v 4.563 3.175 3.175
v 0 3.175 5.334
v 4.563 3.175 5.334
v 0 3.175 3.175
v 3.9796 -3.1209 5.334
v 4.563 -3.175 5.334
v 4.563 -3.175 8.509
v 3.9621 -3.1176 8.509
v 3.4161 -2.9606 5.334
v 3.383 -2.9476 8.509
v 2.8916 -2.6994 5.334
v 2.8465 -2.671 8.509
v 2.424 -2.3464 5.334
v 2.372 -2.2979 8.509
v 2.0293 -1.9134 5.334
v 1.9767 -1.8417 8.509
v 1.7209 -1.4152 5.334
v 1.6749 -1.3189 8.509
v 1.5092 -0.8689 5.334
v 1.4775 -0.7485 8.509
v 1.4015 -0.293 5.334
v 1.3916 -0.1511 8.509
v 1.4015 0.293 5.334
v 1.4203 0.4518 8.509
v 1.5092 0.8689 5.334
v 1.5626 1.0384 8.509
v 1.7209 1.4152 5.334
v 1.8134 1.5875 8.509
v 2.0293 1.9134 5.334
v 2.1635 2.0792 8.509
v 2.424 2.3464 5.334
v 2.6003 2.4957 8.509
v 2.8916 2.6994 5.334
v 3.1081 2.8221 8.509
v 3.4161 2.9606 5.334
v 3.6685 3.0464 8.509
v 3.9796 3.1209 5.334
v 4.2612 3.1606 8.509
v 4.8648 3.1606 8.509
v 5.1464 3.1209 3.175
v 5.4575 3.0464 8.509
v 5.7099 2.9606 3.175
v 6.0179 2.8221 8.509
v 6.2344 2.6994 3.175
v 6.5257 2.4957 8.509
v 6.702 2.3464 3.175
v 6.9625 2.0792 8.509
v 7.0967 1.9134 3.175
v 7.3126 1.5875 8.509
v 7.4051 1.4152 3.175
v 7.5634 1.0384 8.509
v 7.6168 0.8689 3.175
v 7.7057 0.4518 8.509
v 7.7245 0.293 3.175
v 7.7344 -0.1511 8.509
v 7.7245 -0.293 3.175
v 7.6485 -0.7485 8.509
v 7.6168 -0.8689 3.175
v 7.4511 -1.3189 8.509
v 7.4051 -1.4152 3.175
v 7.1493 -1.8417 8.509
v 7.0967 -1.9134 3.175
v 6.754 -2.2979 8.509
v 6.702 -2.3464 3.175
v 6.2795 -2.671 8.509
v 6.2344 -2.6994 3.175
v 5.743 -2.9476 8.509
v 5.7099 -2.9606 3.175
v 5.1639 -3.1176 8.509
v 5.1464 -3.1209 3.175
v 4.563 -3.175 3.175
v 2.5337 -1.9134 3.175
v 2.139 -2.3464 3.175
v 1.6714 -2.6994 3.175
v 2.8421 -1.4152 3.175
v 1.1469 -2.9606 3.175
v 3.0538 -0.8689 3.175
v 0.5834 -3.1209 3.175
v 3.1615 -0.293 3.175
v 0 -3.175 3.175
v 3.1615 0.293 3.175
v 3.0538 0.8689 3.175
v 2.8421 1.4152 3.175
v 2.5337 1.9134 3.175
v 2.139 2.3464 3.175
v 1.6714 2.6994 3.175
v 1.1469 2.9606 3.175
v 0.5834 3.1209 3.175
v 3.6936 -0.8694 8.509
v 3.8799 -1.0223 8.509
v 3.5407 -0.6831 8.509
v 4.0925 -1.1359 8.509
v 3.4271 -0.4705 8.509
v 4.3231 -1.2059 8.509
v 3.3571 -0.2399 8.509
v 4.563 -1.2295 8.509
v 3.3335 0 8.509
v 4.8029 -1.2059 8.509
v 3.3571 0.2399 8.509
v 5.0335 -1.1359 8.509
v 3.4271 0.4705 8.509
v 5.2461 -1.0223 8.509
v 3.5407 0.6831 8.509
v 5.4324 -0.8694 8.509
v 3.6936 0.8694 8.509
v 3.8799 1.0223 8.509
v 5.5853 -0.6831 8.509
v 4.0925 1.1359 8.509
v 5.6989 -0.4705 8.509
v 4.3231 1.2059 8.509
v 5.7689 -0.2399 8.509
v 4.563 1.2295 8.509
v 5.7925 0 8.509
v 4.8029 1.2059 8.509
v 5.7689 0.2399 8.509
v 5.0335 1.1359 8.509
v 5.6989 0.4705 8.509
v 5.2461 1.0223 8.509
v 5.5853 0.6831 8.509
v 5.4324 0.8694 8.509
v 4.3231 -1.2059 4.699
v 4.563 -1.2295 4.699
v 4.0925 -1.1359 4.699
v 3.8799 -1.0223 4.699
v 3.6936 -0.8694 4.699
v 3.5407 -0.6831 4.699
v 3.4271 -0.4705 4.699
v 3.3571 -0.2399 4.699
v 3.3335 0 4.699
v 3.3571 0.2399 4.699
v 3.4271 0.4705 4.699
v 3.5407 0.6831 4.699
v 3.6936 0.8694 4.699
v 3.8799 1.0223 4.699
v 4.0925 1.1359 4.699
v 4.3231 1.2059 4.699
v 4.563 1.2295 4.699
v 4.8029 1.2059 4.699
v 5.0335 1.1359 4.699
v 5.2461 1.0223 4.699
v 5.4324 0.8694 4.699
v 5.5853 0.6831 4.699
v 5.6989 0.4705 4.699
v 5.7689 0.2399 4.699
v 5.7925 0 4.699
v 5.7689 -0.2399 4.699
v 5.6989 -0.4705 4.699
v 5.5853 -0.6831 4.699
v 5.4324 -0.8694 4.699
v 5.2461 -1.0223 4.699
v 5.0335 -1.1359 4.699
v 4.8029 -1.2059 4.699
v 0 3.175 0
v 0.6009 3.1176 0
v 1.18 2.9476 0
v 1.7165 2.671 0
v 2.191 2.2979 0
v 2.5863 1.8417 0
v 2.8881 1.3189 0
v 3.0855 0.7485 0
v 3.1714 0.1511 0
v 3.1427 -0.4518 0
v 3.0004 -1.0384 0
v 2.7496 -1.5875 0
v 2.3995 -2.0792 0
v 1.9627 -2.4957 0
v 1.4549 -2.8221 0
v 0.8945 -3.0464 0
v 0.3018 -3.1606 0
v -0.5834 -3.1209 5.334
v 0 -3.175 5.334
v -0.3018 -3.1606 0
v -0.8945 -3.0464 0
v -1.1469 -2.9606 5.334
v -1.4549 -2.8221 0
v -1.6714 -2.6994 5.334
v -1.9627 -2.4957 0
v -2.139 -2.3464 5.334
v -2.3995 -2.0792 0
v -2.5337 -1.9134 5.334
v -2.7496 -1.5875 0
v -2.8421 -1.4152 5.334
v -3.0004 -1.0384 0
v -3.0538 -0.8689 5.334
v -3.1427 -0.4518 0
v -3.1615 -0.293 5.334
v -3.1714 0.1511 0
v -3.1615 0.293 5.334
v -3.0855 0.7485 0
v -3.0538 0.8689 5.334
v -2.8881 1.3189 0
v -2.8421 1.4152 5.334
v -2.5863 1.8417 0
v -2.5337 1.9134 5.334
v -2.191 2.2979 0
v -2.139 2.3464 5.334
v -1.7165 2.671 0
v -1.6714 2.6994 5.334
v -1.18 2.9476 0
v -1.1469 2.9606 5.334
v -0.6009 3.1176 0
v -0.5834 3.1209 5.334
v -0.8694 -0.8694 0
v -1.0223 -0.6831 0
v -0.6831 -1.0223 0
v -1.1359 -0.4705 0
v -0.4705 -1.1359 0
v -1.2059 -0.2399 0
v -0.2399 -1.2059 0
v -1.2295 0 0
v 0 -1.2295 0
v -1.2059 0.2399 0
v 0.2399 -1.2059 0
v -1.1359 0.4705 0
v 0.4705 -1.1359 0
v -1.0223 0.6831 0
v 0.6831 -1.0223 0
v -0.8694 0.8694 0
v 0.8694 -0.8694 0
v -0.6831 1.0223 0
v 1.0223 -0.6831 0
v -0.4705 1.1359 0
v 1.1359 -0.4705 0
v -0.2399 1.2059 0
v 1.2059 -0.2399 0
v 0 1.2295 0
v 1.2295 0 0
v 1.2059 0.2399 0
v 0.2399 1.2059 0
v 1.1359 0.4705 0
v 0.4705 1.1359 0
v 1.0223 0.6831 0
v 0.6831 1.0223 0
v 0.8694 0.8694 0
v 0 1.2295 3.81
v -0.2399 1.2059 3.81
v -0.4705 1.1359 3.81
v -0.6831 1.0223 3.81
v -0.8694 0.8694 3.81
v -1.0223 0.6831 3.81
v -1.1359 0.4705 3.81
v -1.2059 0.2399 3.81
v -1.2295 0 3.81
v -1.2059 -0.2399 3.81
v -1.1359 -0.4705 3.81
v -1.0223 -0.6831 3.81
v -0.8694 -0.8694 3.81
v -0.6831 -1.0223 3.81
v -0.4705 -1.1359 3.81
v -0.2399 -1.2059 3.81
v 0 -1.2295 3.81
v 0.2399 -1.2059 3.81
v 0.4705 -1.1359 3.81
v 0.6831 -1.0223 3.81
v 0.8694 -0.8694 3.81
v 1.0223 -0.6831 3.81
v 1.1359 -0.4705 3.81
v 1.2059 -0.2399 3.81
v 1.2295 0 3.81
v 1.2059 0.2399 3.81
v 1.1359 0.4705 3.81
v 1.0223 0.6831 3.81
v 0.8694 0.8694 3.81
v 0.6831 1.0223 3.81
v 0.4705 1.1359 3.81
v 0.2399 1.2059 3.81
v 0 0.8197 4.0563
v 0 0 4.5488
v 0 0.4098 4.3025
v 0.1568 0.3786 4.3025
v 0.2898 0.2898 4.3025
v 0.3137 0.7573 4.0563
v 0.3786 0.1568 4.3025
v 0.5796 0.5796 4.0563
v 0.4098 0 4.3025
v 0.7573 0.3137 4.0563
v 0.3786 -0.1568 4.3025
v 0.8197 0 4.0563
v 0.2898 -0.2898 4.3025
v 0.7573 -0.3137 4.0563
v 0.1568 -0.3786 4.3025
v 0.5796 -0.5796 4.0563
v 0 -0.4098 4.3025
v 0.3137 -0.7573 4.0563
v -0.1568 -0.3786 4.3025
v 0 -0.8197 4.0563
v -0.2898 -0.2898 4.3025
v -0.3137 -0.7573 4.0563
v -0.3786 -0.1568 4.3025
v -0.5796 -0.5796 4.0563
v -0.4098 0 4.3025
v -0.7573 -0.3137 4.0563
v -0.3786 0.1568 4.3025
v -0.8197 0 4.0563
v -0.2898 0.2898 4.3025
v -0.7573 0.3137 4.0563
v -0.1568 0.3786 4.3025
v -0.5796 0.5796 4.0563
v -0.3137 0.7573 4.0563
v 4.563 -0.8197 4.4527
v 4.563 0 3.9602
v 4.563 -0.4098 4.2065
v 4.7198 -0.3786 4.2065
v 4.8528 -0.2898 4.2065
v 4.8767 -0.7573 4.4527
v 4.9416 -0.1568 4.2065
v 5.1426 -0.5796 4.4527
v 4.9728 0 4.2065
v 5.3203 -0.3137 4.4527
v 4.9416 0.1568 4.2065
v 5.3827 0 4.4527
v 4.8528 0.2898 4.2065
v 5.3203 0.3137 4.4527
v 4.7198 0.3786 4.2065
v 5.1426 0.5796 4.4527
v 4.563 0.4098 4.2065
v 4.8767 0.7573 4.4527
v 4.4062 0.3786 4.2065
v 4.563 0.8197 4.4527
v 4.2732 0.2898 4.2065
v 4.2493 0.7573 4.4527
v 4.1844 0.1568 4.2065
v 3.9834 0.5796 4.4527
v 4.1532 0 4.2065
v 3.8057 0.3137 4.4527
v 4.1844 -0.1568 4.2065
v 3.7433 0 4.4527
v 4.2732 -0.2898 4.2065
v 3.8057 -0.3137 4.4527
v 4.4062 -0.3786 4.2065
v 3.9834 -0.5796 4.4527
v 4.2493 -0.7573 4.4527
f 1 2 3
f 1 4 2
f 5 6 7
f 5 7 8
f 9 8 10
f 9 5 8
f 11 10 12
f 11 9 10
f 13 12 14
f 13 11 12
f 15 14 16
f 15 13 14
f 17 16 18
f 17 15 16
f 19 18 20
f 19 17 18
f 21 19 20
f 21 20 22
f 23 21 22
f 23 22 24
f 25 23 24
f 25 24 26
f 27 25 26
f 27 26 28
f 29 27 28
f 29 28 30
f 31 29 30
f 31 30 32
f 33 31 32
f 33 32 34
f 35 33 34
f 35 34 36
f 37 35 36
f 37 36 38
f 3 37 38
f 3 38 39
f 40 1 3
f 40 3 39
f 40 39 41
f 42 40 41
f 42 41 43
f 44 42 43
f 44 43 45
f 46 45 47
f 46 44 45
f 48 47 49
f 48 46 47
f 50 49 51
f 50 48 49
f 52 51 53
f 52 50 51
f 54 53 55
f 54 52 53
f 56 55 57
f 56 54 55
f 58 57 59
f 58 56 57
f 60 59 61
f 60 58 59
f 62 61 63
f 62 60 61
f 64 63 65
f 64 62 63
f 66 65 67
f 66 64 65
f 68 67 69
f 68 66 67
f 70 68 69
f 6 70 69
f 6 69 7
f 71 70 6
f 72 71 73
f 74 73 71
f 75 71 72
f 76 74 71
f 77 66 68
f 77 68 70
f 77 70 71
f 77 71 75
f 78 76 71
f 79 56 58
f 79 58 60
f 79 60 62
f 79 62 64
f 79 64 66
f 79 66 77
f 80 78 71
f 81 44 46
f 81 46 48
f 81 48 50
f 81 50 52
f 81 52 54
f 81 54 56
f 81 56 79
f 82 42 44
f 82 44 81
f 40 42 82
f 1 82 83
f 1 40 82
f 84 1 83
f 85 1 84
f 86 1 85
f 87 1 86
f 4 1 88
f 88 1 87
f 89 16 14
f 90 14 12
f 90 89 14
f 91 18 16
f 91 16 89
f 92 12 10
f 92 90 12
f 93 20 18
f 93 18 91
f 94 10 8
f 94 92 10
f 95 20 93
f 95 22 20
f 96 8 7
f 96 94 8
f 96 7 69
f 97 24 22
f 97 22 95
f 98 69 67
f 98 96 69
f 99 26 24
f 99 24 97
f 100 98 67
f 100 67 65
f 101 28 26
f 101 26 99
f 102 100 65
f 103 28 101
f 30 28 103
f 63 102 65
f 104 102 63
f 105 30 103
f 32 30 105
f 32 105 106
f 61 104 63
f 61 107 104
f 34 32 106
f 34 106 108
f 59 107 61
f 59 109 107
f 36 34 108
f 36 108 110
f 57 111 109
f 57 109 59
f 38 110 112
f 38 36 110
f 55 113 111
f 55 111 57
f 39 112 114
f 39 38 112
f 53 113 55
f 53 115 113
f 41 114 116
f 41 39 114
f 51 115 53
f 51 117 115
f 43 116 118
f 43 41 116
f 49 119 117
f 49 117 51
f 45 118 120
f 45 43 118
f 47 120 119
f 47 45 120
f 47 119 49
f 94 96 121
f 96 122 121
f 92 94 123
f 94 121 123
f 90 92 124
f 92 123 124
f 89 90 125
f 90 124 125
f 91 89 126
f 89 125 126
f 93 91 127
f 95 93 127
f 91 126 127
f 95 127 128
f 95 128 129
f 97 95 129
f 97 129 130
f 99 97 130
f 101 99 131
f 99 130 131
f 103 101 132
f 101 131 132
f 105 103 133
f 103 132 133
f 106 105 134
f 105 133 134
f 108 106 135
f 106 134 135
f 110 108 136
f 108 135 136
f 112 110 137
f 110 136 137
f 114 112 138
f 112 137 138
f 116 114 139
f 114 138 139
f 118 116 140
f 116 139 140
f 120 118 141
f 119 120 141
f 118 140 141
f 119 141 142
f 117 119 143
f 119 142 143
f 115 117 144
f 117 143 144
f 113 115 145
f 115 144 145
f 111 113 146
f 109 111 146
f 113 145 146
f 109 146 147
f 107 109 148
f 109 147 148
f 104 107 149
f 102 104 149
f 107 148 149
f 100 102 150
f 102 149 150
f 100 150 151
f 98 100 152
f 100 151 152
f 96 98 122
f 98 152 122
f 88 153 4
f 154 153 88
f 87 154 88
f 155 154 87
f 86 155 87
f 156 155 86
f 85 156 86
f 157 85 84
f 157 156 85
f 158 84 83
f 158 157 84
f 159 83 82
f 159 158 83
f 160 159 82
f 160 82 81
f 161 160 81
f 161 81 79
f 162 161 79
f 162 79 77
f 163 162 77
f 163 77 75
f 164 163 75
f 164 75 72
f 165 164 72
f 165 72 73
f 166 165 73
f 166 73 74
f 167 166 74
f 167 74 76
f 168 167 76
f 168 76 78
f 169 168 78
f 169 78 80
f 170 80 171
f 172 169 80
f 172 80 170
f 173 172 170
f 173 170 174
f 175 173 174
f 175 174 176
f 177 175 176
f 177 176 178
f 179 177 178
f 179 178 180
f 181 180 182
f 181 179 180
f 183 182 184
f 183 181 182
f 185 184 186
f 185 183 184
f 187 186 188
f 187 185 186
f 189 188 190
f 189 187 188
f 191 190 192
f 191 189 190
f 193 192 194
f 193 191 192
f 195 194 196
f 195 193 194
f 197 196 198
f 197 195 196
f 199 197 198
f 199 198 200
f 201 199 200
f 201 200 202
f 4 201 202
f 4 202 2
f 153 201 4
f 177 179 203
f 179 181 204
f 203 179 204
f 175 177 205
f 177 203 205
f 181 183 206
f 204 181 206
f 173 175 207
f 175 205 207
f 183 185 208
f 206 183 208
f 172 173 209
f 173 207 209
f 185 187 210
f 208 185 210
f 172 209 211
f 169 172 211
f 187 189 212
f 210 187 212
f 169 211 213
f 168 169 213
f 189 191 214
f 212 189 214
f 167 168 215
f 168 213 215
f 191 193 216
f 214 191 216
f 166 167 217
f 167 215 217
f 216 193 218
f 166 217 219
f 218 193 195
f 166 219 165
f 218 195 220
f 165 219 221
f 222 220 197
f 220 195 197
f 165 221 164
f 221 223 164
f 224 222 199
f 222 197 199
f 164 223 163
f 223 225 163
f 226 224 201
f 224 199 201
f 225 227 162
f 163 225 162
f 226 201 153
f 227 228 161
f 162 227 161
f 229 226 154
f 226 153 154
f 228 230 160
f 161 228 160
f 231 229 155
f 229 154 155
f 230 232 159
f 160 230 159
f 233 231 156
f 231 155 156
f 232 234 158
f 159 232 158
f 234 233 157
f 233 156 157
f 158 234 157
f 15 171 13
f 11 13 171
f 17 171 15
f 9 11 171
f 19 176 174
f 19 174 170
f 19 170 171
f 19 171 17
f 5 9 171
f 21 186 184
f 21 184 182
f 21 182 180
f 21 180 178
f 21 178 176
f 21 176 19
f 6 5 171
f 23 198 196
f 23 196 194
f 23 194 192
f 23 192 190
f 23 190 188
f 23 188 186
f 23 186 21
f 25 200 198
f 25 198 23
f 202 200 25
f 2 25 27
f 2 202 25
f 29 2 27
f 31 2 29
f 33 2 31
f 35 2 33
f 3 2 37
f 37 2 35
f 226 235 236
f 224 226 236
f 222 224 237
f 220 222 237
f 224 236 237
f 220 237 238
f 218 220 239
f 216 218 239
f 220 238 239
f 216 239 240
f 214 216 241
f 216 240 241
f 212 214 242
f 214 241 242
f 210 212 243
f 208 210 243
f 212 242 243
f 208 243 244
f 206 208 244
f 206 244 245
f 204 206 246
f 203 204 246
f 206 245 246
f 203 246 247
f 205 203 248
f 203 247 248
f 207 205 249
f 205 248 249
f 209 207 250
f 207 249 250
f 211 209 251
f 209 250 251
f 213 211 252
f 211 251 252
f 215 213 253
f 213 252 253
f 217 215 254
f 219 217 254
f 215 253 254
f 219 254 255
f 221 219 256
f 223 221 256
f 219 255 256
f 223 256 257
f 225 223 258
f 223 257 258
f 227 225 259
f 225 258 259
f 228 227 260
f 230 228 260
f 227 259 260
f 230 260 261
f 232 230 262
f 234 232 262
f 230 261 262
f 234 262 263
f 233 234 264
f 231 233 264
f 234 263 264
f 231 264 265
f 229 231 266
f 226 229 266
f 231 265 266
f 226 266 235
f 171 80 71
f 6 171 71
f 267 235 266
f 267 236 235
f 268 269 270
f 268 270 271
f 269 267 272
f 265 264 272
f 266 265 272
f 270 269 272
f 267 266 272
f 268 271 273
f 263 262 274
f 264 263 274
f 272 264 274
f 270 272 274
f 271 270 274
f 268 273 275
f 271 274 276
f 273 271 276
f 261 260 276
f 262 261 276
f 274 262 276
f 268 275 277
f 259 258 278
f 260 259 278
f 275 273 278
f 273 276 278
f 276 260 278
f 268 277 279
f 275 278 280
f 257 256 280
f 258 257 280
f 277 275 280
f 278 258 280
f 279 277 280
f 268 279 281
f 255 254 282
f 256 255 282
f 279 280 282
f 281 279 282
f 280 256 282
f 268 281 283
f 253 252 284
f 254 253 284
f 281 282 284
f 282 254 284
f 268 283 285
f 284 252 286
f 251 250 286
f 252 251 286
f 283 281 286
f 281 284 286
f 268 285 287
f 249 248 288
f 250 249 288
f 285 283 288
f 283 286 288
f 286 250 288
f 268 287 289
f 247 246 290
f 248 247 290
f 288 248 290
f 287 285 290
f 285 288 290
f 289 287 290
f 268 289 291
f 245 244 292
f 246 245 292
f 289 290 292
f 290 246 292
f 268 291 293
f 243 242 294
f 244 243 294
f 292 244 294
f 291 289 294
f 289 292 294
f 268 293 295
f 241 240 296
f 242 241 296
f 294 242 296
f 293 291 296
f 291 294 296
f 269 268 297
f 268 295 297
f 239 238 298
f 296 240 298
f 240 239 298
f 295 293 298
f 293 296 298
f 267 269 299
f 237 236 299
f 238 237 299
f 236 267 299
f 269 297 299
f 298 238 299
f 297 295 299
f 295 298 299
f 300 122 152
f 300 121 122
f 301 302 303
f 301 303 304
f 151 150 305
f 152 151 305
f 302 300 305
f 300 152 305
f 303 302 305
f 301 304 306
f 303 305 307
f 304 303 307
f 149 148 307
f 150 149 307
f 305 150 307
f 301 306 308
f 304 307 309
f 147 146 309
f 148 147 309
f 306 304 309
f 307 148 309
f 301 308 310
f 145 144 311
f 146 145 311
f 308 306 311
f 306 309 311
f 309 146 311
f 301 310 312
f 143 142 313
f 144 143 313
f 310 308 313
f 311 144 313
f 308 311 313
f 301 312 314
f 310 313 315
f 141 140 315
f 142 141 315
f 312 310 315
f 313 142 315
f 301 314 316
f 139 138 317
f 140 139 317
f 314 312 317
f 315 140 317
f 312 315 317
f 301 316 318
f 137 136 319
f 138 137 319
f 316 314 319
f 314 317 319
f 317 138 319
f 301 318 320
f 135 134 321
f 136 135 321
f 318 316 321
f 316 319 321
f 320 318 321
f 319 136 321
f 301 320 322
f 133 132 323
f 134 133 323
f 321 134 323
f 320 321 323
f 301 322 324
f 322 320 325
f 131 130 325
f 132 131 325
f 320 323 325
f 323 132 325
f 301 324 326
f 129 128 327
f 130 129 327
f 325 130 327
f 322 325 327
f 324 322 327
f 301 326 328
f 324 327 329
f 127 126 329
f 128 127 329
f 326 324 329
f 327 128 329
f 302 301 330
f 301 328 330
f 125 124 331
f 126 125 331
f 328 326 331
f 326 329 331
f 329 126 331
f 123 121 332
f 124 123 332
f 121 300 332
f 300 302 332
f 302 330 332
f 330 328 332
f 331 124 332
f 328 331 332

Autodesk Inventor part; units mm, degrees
ref_plane "YZ Plane" through (0, 0, 0) normal (1, 0, 0) x (0, 1, 0)
ref_plane "XZ Plane" through (0, 0, 0) normal (0, 1, 0) x (-1, 0, 0)
ref_plane "XY Plane" through (0, 0, 0) normal (0, 0, 1) x (1, 0, 0)
sketch "Sketch2" plane through (0, 0, 0) normal (0, 0, 1) x (1, 0, 0)
  arc A0 (4.563, -3.175) -> (4.563, 3.175) centre (4.563, 0) ccw
  arc A1 (0, 3.175) -> (0, -3.175) centre (0, 0) ccw
  line L0 (0, 3.175) -> (4.563, 3.175)
  line L1 (0, -3.175) -> (4.563, -3.175)
  dimension "d14" = 6.35
  dimension "d15" = 6.35
  dimension "d16" = 0
  dimension "d17" = 0
  dimension "d18" = 4.563
  dimension "d19" = 0
extrude "Extrusion2" add sketch "Sketch2" along normal blind 8.509
sketch "Sketch3" plane through (0, 0, 8.509) normal (0, 0, 1) x (1, 0, 0)
  point P0 (0, 0)
  point P1 (4.563, 0)
  dimension "d22" = 4.563
  dimension "d23" = 0
hole "Hole1" at (4.563, 0, 8.509) direction (0, 0, -1) diameter 2.459 depth 3.81 tip angle 118 thread size "M3x0.5" class "6H" standard "ISO Metric profile"
sketch "Sketch4" plane through (0, 0, 0) normal (0, 0, -1) x (-1, 0, 0)
  point P0 (0, 0)
hole "Hole2" at (0, 0, 0) direction (0, 0, 1) diameter 2.459 depth 3.81 tip angle 118 thread size "M3x0.5" class "6H" standard "ISO Metric profile"
sketch "Sketch7" plane through (0, 0, 0) normal (0, 0, -1) x (-1, 0, 0)
  arc A0 (0, 3.175) -> (0, -3.175) centre (0, 0) ccw
  arc A1 (-4.563, 3.175) -> (-4.563, -3.175) centre (-4.563, 0) ccw projected
  arc A2 (-4.563, 3.175) -> (-4.563, -3.175) centre (-4.563, 0) ccw
  line L0 (0, -3.175) -> (-4.563, -3.175) projected
  line L1 (-4.563, -3.175) -> (0, -3.175)
  line L2 (0, 3.175) -> (-4.563, 3.175)
extrude "Extrusion5" cut sketch "Sketch7" against normal blind 3.175
sketch "Sketch8" plane through (0, 0, 8.509) normal (0, 0, 1) x (1, 0, 0)
  arc A0 (0, 3.175) -> (0, -3.175) centre (0, 0) ccw
  arc A1 (4.563, 3.175) -> (4.563, -3.175) centre (4.563, 0) ccw
  line L0 (4.563, 3.175) -> (0, 3.175) projected
  line L1 (0, 3.175) -> (4.563, 3.175)
  line L2 (0, -3.175) -> (4.563, -3.175) projected
  line L3 (4.563, -3.175) -> (0, -3.175)
sketch "Sketch8 outline for Extrusion6" plane through (0, 0, 8.509) normal (0, 0, 1) x (1, 0, 0)
  arc A0 (0, 3.175) -> (0, -3.175) centre (0, 0) ccw
  line L0 (4.563, 3.175) -> (0, 3.175)
  arc A1 (4.563, -3.175) -> (4.563, 3.175) centre (4.563, 0) cw
  line L1 (0, -3.175) -> (4.563, -3.175)
extrude "Extrusion6" cut sketch "Sketch8 outline for Extrusion6" against normal blind 3.175
properties part number "PC104_EM-113 standoff_4.563"
